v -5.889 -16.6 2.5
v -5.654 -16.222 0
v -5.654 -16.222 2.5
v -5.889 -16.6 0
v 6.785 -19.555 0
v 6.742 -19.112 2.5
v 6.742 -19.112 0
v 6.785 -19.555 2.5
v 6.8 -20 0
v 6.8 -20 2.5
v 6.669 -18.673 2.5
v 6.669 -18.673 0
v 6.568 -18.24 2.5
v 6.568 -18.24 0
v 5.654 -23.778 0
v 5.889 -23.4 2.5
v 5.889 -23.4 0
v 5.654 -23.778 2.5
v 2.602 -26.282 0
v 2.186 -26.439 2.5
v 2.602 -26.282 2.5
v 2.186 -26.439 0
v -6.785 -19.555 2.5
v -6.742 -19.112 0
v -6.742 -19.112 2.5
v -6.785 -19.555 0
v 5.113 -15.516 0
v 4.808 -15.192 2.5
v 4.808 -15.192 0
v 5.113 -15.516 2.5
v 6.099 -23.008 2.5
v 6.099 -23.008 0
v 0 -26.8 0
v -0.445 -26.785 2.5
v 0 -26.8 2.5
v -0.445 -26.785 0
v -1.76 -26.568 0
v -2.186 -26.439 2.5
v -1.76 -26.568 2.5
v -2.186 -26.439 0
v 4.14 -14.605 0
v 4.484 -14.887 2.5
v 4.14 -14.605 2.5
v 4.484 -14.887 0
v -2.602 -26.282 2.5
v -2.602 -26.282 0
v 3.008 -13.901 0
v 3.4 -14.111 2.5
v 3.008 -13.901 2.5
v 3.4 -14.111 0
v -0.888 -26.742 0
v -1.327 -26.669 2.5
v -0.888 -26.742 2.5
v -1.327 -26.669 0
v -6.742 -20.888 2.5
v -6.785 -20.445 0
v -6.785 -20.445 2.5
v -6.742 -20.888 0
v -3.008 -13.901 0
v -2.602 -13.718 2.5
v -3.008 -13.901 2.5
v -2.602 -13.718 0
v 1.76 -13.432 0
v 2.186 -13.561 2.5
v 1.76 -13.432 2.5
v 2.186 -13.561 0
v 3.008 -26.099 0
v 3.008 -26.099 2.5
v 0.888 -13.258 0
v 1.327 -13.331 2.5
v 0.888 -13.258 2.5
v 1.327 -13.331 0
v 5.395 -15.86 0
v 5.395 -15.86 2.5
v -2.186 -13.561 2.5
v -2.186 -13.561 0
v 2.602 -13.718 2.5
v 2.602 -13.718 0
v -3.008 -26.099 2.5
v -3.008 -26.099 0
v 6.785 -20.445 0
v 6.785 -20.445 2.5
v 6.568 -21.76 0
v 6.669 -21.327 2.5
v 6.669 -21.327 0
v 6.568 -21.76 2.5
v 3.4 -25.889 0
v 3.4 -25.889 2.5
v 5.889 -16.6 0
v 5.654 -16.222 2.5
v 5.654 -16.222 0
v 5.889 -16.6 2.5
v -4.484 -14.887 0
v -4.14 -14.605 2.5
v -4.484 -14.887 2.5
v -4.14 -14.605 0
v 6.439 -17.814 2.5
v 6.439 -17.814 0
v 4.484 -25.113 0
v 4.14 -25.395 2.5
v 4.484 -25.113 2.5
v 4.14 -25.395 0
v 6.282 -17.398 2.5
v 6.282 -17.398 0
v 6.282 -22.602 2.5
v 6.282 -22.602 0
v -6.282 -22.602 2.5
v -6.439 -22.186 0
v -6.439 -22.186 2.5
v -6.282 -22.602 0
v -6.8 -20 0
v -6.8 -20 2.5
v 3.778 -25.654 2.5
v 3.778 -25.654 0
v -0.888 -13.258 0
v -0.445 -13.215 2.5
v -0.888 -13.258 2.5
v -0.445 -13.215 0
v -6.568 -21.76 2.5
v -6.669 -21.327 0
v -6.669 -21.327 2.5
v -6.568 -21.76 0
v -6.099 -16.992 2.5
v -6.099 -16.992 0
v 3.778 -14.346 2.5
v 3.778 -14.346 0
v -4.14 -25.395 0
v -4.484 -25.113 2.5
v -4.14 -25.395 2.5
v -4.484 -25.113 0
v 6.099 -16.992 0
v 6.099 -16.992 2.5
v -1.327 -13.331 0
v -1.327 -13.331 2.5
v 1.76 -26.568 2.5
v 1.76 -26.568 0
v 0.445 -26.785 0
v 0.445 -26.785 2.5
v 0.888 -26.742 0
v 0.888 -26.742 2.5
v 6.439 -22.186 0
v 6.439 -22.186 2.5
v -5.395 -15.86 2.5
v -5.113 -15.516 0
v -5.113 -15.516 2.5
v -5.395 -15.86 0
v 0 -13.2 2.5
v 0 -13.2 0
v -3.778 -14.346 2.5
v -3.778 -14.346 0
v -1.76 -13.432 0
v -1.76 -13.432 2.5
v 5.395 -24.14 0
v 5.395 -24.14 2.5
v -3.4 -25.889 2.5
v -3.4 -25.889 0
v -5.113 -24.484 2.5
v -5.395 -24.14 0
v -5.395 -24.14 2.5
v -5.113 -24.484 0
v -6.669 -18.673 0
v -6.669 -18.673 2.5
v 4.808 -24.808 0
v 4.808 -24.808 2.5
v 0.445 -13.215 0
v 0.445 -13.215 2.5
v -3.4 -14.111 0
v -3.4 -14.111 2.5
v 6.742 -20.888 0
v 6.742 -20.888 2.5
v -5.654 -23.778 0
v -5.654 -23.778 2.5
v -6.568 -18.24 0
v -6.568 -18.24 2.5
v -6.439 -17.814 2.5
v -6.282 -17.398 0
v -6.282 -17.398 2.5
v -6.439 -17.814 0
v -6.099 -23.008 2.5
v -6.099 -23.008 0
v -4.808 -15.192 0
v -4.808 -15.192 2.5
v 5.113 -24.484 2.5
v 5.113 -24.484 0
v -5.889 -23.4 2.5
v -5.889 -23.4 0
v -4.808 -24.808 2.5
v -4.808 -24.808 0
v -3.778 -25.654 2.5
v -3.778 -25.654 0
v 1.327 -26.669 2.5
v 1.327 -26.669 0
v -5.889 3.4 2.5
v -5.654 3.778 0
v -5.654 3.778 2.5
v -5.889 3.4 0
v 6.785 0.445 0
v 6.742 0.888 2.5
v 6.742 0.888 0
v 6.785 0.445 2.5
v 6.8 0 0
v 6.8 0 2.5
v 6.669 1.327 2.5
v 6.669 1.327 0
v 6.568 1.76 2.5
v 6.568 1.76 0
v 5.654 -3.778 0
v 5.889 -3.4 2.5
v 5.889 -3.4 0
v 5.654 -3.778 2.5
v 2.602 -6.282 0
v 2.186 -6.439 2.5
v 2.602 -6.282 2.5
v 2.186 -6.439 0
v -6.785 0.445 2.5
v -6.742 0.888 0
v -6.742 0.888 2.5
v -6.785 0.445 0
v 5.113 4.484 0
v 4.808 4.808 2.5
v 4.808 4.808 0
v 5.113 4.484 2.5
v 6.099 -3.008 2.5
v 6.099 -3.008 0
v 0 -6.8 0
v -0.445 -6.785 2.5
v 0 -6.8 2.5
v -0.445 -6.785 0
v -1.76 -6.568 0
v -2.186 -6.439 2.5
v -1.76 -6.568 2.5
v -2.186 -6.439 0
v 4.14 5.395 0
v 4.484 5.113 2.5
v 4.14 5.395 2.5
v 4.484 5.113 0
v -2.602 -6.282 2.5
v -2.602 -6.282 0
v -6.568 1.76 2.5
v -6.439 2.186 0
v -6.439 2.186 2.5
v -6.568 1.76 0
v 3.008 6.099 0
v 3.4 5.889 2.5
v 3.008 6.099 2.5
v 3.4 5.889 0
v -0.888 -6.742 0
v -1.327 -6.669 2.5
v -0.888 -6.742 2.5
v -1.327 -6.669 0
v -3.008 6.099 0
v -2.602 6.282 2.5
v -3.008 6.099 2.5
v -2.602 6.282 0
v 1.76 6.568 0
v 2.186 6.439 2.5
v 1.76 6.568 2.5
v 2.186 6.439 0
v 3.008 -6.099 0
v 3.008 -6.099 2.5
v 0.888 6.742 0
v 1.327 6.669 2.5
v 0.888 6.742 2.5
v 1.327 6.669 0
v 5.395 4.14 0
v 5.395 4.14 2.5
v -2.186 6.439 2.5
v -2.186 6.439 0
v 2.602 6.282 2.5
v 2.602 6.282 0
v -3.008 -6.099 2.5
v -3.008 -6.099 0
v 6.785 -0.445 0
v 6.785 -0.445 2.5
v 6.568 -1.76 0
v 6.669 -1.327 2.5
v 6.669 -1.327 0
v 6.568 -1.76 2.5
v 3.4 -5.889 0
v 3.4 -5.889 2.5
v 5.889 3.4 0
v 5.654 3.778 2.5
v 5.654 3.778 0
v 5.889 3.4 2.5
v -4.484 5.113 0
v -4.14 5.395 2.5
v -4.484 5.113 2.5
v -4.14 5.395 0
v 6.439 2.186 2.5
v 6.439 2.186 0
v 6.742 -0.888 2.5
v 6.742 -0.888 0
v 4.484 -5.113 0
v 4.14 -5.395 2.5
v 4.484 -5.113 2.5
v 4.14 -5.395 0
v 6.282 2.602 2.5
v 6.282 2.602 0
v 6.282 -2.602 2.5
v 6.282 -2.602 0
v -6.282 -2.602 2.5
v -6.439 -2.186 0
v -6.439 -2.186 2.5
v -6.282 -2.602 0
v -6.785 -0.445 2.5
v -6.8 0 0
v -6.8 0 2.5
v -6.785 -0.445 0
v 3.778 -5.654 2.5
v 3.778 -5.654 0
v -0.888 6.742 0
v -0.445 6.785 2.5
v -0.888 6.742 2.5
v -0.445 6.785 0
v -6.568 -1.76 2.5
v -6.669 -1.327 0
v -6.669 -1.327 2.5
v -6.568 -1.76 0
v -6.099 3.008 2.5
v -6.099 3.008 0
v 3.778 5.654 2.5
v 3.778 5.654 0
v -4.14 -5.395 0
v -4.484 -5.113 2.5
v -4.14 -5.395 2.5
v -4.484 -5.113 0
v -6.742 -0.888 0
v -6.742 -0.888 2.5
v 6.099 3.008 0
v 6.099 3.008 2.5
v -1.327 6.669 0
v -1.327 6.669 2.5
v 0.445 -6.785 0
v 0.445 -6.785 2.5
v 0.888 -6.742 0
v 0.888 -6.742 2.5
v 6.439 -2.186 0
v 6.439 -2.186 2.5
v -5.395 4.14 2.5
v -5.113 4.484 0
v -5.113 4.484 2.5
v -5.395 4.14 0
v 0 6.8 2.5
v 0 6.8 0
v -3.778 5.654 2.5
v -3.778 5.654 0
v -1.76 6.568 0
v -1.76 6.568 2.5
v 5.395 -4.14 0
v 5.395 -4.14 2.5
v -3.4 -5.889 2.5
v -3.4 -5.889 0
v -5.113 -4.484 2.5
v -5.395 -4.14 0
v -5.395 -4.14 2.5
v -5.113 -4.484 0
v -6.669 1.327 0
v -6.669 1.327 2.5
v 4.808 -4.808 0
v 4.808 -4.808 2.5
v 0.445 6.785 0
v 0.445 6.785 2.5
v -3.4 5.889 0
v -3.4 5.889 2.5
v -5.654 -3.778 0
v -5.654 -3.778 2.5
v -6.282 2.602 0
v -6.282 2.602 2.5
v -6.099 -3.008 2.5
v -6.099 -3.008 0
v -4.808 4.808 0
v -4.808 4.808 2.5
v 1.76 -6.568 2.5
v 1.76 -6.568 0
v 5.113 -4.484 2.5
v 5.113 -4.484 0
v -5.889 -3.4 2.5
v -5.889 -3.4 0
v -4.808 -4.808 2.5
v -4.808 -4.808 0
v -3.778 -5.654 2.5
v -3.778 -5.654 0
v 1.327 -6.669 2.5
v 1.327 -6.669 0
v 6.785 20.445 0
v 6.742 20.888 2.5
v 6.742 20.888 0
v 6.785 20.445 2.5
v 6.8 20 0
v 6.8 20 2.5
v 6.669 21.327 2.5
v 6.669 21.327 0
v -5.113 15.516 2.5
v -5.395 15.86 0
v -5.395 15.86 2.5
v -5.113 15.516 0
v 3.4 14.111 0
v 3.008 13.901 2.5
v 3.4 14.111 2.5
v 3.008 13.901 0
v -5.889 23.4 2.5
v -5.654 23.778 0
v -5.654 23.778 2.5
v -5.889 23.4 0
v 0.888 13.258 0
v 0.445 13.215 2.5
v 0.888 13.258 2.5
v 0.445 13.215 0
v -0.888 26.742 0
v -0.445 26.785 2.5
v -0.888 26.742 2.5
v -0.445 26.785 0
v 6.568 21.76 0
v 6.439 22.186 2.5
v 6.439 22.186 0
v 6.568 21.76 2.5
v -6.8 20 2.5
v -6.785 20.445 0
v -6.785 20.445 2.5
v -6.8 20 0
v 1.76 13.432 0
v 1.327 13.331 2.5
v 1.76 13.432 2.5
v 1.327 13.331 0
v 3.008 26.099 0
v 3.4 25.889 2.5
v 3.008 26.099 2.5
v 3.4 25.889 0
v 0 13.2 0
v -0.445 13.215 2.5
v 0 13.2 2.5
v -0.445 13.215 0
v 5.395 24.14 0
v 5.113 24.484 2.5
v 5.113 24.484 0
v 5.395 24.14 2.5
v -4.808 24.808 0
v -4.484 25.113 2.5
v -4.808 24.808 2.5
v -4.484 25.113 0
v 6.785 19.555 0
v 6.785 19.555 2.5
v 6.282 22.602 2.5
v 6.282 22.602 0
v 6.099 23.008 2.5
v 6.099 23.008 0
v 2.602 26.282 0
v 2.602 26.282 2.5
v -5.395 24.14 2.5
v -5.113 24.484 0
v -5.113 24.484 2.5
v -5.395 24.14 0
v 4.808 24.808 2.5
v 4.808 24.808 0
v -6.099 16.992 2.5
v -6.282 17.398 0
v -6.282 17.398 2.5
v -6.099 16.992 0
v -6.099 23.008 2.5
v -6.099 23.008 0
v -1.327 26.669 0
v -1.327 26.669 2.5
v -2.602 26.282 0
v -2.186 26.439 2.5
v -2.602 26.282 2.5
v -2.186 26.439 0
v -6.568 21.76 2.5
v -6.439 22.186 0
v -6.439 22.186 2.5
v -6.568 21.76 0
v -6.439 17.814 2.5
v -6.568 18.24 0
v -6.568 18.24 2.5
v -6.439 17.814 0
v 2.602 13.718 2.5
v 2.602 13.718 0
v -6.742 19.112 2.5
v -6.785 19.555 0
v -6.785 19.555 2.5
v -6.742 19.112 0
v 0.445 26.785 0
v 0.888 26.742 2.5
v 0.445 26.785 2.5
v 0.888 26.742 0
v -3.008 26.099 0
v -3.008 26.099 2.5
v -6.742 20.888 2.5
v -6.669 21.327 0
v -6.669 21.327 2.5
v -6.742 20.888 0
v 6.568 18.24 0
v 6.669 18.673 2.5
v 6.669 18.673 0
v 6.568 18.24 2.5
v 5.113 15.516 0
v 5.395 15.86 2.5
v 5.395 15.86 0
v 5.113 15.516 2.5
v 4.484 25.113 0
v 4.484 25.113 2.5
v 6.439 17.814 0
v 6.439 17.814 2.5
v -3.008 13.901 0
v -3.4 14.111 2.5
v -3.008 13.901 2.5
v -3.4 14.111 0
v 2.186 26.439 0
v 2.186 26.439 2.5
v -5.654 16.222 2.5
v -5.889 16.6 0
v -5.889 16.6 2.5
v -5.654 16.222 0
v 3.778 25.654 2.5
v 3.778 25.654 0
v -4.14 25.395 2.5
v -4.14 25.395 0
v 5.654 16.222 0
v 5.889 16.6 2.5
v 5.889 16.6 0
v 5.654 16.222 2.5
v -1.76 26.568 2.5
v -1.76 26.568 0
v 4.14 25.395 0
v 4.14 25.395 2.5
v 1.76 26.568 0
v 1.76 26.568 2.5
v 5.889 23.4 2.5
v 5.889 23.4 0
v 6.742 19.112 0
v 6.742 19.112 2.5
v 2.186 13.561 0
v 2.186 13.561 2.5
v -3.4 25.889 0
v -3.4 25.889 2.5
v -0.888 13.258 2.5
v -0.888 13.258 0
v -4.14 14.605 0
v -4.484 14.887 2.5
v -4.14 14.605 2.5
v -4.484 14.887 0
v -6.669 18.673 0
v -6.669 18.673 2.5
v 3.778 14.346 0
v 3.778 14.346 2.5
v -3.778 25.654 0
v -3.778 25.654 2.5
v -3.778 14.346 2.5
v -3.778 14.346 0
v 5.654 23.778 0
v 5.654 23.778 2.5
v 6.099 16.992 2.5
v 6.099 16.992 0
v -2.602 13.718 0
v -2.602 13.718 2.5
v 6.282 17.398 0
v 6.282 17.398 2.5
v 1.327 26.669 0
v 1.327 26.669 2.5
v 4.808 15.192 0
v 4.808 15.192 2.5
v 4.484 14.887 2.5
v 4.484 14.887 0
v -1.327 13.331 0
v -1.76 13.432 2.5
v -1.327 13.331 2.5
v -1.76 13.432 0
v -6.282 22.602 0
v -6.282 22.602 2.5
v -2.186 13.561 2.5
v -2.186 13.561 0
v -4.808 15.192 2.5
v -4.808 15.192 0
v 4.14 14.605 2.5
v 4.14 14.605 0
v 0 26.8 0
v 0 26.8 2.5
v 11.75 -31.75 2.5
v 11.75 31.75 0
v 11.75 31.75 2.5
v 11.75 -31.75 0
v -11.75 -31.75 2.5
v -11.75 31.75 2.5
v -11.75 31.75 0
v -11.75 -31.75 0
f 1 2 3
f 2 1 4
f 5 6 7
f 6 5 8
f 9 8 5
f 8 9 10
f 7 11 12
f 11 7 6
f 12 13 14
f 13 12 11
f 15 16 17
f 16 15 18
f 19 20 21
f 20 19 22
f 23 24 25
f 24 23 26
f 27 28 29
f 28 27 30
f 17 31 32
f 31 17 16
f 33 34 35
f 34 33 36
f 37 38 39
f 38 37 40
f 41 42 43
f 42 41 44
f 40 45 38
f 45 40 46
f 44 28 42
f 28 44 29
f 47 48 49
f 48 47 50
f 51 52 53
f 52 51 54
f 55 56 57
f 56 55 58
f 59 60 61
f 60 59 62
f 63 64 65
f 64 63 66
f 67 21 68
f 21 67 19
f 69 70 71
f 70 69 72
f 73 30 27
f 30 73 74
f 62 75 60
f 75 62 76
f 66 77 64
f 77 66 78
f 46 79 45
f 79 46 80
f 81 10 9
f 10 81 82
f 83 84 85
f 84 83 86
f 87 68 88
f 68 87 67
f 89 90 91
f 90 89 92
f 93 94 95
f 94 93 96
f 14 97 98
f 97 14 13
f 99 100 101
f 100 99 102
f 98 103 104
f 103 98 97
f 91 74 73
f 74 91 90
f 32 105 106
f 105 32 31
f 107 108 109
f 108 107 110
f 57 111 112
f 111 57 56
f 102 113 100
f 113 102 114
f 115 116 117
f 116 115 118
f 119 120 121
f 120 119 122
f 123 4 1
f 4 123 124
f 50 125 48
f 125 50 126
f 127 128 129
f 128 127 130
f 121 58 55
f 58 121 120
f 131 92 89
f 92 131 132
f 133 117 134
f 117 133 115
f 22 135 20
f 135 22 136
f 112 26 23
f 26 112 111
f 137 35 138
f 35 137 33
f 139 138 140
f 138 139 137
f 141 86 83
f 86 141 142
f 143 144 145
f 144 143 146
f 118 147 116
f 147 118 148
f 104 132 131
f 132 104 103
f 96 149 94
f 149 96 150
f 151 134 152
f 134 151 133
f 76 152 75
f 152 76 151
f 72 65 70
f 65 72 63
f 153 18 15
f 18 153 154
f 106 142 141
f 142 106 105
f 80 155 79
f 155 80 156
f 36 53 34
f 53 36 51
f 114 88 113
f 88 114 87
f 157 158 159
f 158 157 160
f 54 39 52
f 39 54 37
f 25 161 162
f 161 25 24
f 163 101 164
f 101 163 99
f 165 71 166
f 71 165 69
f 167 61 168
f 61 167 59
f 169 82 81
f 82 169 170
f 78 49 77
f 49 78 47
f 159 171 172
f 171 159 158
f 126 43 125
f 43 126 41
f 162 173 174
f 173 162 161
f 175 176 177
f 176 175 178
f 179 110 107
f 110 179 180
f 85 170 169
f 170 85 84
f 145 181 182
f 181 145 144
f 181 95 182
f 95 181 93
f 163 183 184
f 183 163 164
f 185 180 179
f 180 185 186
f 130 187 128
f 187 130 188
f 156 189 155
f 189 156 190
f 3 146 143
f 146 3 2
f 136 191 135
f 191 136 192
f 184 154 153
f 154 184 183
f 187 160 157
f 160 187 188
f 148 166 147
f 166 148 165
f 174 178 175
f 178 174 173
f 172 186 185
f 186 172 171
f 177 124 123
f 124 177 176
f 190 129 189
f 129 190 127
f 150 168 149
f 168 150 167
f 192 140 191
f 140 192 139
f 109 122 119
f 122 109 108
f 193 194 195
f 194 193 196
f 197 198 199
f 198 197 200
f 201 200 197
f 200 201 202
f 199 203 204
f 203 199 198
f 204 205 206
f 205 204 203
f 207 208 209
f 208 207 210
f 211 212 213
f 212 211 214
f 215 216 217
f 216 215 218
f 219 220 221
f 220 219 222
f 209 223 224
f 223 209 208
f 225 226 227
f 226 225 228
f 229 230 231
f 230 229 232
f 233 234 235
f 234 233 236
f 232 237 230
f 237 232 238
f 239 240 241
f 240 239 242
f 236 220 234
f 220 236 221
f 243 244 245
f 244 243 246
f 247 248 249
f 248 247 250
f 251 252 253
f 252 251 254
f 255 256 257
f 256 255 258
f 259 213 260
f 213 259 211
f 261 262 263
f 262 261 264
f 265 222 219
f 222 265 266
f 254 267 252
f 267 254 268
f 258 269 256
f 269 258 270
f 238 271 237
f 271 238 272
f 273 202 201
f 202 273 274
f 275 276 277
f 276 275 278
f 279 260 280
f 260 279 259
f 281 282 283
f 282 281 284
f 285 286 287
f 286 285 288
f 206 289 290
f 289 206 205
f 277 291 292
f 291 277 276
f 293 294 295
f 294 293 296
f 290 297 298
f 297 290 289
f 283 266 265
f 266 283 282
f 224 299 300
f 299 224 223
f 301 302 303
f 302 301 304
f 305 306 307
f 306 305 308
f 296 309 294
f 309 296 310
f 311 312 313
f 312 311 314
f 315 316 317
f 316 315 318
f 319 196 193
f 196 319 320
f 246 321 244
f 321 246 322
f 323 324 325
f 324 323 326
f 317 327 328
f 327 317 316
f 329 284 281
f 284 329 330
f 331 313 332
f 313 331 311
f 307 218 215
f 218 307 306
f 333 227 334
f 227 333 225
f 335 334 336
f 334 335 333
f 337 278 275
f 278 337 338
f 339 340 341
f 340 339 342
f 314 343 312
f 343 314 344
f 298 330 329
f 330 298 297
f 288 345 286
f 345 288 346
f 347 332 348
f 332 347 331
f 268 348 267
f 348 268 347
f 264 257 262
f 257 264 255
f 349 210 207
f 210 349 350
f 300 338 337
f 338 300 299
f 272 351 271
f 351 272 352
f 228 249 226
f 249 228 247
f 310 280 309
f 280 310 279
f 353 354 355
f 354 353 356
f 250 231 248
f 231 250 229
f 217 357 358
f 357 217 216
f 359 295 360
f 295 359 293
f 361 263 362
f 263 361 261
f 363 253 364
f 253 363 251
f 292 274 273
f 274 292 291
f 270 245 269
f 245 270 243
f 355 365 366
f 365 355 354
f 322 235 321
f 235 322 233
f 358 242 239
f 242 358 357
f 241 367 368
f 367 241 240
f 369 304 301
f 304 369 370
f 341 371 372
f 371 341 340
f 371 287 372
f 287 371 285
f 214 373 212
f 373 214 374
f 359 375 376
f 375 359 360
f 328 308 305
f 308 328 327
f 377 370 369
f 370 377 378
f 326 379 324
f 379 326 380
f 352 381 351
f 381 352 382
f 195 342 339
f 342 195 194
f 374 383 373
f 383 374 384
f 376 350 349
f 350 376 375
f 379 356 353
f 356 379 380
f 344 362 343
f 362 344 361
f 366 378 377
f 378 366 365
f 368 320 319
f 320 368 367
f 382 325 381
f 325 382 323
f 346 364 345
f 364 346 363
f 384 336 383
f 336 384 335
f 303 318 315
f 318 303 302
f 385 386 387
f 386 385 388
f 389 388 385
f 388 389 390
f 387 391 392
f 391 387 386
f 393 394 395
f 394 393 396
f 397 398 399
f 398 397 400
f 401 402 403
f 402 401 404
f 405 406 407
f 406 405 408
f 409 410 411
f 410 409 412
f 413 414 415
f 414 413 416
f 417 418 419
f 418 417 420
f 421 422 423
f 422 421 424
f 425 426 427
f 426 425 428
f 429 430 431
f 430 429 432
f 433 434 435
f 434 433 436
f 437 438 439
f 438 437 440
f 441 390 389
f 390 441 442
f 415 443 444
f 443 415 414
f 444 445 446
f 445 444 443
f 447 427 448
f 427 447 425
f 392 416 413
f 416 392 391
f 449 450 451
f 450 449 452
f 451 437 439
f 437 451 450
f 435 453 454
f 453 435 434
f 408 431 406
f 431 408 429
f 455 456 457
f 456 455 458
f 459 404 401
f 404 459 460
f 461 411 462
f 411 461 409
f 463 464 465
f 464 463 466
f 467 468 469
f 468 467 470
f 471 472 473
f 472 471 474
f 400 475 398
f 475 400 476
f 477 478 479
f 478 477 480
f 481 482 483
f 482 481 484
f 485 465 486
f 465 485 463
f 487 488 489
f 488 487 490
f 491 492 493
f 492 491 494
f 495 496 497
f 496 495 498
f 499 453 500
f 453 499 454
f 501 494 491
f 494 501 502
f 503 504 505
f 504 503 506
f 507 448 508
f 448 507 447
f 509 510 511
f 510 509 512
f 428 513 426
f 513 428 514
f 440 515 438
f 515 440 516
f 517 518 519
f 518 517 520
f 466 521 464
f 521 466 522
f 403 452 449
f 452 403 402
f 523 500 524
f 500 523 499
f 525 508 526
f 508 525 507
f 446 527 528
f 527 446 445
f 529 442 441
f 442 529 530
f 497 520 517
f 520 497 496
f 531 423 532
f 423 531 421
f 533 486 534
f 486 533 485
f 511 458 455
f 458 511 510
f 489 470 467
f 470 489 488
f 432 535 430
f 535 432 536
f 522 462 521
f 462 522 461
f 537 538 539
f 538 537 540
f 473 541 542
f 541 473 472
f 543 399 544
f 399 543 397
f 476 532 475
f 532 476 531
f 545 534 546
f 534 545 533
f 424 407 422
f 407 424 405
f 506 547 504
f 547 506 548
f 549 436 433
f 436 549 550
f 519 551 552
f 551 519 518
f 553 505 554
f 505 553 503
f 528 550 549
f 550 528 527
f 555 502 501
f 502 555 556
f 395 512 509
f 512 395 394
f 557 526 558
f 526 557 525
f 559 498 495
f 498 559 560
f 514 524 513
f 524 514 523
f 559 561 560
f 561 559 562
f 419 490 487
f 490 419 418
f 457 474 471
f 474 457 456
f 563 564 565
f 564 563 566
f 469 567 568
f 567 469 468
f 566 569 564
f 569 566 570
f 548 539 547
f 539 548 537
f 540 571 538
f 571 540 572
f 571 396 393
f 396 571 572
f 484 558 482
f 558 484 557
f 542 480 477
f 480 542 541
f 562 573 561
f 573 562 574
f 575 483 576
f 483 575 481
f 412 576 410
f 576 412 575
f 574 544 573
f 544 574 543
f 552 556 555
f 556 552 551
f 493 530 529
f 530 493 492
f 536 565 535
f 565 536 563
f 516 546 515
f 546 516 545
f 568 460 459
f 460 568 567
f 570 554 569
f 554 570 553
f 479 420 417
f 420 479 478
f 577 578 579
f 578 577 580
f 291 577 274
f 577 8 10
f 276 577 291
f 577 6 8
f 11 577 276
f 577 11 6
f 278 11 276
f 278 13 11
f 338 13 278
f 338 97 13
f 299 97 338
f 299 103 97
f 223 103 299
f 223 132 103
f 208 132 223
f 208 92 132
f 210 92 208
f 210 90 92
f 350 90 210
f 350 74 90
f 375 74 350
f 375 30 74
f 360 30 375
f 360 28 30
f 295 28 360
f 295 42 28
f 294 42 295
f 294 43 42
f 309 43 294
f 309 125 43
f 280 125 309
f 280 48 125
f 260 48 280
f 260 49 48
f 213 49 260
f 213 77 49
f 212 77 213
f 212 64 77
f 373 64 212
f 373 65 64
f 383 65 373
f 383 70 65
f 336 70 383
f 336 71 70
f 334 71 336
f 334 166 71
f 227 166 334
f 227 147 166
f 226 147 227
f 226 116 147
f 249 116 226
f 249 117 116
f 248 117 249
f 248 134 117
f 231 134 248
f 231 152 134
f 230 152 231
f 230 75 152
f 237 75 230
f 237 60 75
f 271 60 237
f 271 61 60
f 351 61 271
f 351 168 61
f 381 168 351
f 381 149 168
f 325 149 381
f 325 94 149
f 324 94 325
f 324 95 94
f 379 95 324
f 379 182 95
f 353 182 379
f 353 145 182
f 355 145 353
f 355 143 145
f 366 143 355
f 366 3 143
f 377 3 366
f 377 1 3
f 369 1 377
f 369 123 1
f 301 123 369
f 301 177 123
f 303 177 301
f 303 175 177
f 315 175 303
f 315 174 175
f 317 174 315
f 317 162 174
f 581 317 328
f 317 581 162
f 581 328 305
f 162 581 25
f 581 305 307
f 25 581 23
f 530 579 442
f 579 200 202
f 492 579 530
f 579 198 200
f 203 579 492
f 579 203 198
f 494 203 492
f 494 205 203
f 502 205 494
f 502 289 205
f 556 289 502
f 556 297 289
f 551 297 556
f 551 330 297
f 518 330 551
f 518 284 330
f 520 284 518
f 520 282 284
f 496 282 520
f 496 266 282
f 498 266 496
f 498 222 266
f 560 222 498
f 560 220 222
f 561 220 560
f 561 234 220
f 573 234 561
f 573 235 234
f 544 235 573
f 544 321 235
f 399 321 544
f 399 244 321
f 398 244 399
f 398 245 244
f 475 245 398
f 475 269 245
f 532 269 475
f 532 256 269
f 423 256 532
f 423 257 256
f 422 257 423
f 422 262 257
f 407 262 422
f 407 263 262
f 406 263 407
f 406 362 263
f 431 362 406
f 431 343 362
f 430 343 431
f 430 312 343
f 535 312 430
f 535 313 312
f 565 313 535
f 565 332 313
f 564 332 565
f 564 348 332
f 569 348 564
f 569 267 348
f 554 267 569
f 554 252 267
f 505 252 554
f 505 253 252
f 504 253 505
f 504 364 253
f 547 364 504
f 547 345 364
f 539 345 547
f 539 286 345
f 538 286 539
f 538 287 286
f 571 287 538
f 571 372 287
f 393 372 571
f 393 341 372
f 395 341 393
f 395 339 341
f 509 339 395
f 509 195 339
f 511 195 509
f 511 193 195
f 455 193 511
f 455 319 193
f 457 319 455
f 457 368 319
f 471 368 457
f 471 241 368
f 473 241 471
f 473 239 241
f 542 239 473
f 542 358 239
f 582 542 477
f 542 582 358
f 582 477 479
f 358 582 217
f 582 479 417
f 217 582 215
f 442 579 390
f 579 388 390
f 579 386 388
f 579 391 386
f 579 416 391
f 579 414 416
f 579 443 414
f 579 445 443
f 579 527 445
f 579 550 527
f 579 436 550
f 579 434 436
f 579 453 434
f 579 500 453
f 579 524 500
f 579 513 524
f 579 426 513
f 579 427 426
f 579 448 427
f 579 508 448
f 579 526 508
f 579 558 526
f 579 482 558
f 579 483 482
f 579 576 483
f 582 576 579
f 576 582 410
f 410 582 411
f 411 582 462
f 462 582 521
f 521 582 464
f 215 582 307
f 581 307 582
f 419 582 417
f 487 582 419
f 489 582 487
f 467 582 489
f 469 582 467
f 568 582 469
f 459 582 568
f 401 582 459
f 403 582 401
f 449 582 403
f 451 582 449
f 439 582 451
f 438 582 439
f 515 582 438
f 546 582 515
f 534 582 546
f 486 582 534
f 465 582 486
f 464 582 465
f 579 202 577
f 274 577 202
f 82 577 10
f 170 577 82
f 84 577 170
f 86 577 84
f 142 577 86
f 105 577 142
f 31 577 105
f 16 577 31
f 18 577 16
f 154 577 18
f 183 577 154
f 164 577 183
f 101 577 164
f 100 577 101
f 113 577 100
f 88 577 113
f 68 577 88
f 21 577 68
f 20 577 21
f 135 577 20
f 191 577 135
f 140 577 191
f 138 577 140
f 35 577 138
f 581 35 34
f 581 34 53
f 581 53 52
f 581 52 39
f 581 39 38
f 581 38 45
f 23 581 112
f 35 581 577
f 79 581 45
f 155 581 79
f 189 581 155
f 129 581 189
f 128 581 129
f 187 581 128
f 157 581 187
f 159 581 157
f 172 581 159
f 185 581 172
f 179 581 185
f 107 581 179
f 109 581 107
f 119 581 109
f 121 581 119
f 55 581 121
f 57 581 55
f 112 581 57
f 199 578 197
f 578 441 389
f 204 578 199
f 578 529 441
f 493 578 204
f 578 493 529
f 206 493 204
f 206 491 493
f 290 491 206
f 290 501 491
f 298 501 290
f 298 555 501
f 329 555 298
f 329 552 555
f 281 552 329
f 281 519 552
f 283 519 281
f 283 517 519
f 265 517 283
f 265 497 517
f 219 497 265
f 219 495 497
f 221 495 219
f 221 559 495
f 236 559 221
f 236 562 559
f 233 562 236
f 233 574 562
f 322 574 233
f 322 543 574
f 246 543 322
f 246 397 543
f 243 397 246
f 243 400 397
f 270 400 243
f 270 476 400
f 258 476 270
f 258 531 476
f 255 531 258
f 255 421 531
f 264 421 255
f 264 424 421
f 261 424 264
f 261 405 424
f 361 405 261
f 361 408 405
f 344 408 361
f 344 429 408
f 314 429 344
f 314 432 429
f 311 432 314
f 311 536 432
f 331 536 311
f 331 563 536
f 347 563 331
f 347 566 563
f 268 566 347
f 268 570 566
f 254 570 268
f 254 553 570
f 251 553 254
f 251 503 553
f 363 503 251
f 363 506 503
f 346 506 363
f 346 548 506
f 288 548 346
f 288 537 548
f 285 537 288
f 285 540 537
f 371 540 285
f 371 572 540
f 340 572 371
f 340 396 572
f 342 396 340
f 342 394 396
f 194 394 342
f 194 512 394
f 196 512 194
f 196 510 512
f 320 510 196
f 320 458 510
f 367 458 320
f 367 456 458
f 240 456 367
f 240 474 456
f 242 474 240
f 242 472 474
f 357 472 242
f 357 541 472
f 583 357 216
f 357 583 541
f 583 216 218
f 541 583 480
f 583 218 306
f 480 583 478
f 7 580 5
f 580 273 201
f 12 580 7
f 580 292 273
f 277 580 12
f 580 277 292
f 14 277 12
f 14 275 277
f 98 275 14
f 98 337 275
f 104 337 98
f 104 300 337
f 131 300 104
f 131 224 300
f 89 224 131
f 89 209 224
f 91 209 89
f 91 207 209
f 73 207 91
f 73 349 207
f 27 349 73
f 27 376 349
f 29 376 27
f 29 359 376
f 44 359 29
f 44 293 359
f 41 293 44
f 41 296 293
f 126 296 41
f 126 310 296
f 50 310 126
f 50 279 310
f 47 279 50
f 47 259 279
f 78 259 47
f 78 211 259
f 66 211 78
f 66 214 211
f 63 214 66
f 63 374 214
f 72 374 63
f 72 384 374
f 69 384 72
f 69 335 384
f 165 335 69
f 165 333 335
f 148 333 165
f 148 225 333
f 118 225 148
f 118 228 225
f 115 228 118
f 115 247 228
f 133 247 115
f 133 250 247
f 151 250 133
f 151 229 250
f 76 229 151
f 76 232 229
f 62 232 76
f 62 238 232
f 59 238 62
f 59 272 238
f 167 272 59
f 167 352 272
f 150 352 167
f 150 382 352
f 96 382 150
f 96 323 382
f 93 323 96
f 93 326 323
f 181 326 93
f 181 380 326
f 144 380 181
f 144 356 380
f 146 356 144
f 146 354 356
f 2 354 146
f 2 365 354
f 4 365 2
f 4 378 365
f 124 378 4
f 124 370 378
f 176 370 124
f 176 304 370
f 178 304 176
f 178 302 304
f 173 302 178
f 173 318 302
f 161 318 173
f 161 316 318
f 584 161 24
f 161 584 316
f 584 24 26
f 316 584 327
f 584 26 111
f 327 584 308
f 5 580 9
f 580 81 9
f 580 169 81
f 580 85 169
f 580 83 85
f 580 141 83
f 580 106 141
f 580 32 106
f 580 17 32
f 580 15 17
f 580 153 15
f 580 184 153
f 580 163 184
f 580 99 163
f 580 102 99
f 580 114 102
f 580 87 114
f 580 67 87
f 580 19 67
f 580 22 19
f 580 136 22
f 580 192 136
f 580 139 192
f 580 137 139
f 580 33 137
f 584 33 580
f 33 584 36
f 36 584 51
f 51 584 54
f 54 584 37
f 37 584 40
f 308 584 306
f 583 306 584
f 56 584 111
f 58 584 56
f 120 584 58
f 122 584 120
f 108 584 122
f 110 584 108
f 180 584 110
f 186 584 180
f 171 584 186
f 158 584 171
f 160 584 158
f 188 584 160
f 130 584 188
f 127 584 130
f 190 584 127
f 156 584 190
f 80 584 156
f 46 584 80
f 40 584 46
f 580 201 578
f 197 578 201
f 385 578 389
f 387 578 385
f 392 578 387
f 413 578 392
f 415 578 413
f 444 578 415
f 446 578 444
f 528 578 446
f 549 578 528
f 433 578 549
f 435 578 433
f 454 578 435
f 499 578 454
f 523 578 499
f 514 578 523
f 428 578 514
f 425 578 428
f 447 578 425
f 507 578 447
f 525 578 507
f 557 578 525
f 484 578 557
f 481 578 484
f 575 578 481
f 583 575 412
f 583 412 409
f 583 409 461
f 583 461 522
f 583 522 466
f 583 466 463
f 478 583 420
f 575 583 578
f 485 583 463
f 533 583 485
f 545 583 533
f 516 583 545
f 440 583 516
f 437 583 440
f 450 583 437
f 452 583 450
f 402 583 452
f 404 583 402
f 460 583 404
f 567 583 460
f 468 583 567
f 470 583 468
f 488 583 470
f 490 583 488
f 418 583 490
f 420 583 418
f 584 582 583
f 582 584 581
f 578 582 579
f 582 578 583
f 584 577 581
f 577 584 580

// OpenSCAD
// Open Rally Remote — three-button carrier fit plate, V0.1
// Dimensions use the APEM IS series published panel cutout and spacing.
// This is a fit-check plate, not the complete enclosure or handlebar clamp.

$fn = 96;

switch_cutout_diameter = 13.6;
switch_bezel_diameter = 17.5;
switch_pitch = 20.0;
panel_thickness = 2.5; // APEM IS specified panel range: 1.5–4.0 mm
edge_margin = 3.0;     // Explicit design allowance beyond bezel edge
button_count = 3;

panel_width = switch_bezel_diameter + 2 * edge_margin;
panel_length = switch_bezel_diameter + 2 * edge_margin
             + switch_pitch * (button_count - 1);

difference() {
    // XY outline is 23.5 × 63.5 mm; bottom face is at Z=0.
    translate([0, 0, panel_thickness / 2])
        cube([panel_width, panel_length, panel_thickness], center=true);

    // One column of three Ø13.6 mm panel cutouts, on 20 mm centers.
    for (i = [0 : button_count - 1]) {
        y = -panel_length / 2 + edge_margin + switch_bezel_diameter / 2
          + i * switch_pitch;
        translate([0, y, -0.1])
            cylinder(d=switch_cutout_diameter, h=panel_thickness + 0.2);
    }
}
